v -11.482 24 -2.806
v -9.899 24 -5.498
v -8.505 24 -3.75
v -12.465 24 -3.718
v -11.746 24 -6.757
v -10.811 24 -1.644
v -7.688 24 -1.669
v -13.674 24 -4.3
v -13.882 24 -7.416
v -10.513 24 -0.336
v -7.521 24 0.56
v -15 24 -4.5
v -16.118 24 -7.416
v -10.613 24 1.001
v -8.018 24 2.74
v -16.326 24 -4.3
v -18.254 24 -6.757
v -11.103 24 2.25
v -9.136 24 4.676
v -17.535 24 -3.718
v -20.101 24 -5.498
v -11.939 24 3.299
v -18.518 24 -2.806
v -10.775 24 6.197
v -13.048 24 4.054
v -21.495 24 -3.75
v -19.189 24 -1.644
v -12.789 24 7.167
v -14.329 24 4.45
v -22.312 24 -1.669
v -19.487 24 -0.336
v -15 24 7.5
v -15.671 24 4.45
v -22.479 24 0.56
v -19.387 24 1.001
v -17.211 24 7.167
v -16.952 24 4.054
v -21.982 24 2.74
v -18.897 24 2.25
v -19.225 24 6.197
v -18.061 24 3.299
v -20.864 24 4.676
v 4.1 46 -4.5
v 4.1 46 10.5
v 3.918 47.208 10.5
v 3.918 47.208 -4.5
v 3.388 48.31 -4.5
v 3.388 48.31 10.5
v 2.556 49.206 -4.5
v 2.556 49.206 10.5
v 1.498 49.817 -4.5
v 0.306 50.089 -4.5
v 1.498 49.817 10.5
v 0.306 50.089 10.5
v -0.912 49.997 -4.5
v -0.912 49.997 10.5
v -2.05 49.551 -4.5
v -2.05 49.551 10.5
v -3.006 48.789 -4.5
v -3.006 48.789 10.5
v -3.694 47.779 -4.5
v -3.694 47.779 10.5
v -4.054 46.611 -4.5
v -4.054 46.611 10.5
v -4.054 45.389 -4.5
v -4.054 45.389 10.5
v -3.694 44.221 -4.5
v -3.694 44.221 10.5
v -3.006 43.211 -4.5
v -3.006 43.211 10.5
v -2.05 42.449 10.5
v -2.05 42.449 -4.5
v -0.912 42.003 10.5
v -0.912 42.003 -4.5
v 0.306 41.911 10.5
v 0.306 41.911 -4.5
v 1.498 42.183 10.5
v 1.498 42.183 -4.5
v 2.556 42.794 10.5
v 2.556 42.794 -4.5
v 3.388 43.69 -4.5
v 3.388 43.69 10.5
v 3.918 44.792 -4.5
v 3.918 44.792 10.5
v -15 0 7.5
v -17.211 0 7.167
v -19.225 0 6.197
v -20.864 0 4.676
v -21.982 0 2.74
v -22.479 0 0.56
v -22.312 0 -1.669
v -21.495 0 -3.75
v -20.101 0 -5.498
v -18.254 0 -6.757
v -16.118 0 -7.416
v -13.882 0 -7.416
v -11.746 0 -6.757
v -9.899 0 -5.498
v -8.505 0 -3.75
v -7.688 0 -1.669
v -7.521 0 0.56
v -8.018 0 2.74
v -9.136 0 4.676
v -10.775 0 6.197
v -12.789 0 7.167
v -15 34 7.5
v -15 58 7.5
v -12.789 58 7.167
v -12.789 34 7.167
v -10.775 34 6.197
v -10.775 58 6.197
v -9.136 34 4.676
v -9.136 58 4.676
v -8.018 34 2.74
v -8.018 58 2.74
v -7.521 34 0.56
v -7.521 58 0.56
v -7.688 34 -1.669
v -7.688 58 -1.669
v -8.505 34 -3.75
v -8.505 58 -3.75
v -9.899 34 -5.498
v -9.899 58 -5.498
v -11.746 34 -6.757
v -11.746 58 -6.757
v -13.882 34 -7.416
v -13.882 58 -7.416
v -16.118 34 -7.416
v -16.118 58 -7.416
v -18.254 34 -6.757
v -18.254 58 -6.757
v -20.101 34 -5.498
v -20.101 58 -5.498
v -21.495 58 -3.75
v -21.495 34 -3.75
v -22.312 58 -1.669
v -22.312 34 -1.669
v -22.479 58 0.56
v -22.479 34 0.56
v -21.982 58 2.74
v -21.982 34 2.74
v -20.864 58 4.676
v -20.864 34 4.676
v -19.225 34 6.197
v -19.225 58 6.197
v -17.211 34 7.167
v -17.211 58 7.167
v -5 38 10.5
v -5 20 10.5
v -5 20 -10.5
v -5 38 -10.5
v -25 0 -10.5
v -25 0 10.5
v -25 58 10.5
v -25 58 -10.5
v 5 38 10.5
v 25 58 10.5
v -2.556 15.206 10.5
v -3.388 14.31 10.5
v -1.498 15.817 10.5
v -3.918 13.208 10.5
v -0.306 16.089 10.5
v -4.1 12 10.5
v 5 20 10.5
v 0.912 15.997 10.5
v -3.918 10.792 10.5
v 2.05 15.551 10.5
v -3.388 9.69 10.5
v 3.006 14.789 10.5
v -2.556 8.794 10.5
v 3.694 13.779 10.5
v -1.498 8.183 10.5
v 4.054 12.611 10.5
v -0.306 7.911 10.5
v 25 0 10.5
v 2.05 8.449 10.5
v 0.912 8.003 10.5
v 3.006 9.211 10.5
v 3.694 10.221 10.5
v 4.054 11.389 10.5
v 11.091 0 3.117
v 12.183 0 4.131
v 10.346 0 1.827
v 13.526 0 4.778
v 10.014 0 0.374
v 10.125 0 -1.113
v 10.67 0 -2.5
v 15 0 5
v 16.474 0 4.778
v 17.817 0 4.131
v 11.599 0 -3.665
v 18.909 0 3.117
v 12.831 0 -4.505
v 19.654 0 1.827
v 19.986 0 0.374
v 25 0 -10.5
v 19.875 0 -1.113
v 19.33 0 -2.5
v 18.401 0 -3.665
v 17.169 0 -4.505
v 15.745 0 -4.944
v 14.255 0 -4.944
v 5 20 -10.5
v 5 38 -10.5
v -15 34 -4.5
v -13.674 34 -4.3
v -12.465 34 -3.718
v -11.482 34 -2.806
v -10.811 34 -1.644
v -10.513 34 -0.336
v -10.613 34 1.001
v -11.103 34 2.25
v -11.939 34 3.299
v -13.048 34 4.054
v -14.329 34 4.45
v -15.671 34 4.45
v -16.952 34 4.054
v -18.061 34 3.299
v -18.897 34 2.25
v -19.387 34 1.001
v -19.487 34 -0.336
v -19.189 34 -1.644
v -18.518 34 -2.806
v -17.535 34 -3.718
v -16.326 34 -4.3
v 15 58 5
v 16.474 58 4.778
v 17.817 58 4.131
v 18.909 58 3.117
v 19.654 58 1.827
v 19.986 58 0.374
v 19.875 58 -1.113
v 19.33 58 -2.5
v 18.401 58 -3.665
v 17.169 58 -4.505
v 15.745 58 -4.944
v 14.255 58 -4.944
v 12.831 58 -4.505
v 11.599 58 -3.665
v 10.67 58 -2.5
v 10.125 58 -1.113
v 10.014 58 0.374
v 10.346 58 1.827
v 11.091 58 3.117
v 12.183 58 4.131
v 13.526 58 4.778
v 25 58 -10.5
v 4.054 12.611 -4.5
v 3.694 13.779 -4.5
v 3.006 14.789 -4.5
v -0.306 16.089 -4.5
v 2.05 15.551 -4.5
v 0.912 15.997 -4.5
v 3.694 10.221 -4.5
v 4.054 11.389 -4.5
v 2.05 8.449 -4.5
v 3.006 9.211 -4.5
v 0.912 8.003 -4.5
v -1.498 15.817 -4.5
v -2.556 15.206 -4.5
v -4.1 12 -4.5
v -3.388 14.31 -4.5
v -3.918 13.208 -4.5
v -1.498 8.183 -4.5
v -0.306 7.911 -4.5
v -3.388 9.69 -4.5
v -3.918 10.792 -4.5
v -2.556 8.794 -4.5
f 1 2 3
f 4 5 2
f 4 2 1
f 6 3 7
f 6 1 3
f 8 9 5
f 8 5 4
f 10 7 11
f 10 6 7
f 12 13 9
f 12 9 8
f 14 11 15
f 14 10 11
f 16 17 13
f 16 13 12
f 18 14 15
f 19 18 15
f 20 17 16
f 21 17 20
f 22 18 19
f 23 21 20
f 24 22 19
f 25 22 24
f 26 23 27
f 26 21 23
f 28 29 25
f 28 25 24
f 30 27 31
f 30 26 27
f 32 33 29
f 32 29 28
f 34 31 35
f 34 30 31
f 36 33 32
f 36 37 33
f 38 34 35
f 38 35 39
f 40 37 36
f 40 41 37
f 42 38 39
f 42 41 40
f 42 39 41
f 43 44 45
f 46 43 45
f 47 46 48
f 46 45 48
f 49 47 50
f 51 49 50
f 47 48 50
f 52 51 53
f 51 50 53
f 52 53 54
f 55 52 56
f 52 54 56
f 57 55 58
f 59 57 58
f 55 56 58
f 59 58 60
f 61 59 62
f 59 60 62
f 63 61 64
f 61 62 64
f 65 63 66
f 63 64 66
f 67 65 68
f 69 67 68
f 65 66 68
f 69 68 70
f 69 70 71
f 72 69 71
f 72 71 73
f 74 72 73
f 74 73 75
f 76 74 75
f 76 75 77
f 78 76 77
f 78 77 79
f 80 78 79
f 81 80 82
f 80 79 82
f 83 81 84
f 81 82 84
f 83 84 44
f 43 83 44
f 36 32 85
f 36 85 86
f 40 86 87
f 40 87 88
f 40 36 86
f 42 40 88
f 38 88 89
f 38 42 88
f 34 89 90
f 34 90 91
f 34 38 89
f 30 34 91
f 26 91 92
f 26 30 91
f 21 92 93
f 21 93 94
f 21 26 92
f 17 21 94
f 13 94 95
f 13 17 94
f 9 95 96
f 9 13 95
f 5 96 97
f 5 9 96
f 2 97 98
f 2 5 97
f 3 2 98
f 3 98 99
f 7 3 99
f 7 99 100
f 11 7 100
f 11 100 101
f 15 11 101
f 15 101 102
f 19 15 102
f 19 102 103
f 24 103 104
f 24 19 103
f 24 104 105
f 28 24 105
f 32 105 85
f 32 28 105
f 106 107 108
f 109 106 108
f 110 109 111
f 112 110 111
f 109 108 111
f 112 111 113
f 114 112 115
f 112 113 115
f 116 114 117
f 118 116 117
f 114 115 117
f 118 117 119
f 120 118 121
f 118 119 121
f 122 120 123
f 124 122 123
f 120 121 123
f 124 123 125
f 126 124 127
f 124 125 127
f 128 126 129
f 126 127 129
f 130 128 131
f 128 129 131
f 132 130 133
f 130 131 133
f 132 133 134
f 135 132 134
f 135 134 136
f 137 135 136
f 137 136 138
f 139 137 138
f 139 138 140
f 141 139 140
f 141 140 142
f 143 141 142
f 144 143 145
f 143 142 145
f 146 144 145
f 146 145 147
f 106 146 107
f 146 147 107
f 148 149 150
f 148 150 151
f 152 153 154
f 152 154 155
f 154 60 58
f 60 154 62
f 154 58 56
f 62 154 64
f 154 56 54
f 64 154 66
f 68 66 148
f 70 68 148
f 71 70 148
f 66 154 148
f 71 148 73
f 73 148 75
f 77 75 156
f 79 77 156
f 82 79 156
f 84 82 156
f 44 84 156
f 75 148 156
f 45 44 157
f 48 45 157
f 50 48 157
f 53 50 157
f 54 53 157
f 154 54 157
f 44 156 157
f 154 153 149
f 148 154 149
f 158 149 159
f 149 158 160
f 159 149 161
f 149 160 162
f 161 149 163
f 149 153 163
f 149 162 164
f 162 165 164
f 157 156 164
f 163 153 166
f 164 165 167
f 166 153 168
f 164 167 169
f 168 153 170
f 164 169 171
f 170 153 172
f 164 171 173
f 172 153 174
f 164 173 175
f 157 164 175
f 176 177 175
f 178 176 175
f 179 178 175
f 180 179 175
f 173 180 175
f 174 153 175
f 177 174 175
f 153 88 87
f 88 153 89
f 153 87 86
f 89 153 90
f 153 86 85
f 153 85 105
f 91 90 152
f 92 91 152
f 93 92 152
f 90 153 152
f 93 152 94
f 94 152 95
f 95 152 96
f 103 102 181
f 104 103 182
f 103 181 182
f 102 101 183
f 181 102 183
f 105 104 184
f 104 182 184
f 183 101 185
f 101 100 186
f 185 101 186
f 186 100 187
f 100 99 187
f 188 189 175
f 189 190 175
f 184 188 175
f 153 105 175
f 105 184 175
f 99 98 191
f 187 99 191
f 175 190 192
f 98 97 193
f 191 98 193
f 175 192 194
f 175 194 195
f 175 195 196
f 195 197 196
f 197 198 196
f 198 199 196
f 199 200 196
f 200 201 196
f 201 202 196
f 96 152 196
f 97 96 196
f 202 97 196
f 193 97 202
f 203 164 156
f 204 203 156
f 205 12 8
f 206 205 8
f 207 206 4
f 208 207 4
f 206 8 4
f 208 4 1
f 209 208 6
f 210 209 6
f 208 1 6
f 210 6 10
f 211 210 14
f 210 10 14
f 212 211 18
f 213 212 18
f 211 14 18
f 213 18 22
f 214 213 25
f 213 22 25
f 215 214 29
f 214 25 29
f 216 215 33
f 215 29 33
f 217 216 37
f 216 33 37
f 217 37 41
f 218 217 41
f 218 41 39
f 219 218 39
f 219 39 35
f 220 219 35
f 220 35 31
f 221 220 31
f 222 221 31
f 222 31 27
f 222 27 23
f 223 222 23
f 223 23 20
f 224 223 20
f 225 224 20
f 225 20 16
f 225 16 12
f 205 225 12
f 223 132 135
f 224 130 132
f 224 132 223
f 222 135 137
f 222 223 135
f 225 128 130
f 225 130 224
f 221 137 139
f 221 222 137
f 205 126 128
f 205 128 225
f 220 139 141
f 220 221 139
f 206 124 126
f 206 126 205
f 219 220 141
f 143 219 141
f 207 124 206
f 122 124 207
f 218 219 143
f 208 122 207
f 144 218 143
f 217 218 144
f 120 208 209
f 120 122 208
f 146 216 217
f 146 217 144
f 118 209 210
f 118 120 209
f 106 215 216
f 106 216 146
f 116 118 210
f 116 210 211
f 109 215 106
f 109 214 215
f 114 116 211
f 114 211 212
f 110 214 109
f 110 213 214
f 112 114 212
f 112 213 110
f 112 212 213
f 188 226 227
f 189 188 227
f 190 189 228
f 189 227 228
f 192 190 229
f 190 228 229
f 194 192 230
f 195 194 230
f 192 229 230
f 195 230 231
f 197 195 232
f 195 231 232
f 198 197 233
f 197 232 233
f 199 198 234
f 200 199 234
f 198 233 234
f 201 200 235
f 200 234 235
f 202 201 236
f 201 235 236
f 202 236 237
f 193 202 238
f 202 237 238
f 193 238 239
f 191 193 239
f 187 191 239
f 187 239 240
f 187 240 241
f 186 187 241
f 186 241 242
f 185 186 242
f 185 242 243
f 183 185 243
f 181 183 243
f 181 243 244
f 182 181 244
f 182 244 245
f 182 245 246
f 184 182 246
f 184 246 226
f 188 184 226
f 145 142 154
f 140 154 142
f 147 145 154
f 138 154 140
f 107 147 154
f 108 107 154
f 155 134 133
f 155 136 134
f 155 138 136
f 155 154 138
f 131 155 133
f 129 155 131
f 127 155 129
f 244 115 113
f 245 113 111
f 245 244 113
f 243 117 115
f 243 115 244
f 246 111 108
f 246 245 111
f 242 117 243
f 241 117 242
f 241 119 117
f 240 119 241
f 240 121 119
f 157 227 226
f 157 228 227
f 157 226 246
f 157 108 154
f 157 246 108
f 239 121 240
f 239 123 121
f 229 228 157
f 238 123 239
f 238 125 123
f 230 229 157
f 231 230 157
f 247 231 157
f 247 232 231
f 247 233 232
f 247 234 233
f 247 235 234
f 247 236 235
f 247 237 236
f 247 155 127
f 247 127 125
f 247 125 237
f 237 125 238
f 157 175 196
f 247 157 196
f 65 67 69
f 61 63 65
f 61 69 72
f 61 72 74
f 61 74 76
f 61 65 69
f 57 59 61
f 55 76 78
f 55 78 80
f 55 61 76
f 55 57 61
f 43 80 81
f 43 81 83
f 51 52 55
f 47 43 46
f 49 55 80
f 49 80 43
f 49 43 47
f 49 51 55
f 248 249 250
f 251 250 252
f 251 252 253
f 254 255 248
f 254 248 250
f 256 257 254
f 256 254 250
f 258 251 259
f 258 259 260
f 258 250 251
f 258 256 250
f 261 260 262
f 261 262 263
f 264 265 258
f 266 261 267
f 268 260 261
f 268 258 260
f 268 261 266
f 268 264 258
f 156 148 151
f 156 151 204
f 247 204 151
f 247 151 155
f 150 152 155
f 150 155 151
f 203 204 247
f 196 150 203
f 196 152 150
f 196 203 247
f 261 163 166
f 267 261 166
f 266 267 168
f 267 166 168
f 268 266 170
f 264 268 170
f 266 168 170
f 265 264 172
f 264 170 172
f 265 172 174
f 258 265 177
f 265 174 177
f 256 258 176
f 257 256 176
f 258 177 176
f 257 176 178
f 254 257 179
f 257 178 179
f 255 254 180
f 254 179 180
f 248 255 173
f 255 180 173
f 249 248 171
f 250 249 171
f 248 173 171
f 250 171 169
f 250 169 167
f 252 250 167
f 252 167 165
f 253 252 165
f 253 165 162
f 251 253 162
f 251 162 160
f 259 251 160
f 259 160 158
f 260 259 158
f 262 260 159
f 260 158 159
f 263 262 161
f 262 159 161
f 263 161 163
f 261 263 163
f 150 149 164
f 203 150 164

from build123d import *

# Parameters (mm, degrees)
SKETCH1_W           = 50
SKETCH1_H           = 21
BOSS_EXTRUDE1_DEPTH = 58
SKETCH3_R           = 7.5
CUT_EXTRUDE1_DEPTH  = 24
CUT_EXTRUDE2_REACH  = 66.025
SKETCH4_R           = 5
CUT_EXTRUDE3_START  = -24
SKETCH5_R           = 7.5
CUT_EXTRUDE3_DEPTH  = 24
CUT_EXTRUDE4_REACH  = 66.025
SKETCH6_R           = 4.5
CUT_EXTRUDE5_REACH  = 68.558
SKETCH8_W           = 10
SKETCH8_H           = 18
SKETCH7_R           = 4.1
CUT_EXTRUDE6_DEPTH  = 15


with BuildPart() as part:
    # Sketch1 → Boss-Extrude1 (new body)
    with BuildSketch(Plane(origin=(0, 0, 0), x_dir=(1, 0, 0), z_dir=(0, 1, 0))):
        Rectangle(SKETCH1_W, SKETCH1_H)
    extrude(amount=BOSS_EXTRUDE1_DEPTH)

    # Sketch3 → Cut-Extrude1 (cut)
    with BuildSketch(Plane(origin=(0, 58, 0), x_dir=(1, 0, 0), z_dir=(0, 1, 0))):
        with Locations(Location((-15, 0, 0), (0, 0, 270))):
            Circle(SKETCH3_R)
    extrude(amount=-CUT_EXTRUDE1_DEPTH, mode=Mode.SUBTRACT)

    # Sketch4 → Cut-Extrude2 (cut, up to next)
    with BuildSketch(Plane(origin=(0, 58, 0), x_dir=(1, 0, 0), z_dir=(0, 1, 0)), mode=Mode.PRIVATE) as cut_extrude2_sk1:
        with Locations(Location((15, 0, 0), (0, 0, 270))):
            Circle(SKETCH4_R)
    cut_extrude2_tool1 = extrude(cut_extrude2_sk1.sketch, amount=-CUT_EXTRUDE2_REACH, mode=Mode.PRIVATE) & part.part
    add(cut_extrude2_tool1.solids().sort_by_distance((15, 58, 0))[0], mode=Mode.SUBTRACT)

    # Sketch5 → Cut-Extrude3 (cut)
    with BuildSketch(Plane.XZ.offset(CUT_EXTRUDE3_START)):
        with Locations(Location((-15, 0, 0), (0, 0, 90))):
            Circle(SKETCH5_R)
    extrude(amount=CUT_EXTRUDE3_DEPTH, mode=Mode.SUBTRACT)

    # Sketch6 → Cut-Extrude4 (cut, up to next)
    with BuildSketch(Plane.XZ, mode=Mode.PRIVATE) as cut_extrude4_sk1:
        with Locations(Location((-15, 0, 0), (0, 0, 270))):
            Circle(SKETCH6_R)
    cut_extrude4_tool1 = extrude(cut_extrude4_sk1.sketch, amount=-CUT_EXTRUDE4_REACH, mode=Mode.PRIVATE) & part.part
    add(cut_extrude4_tool1.solids().sort_by_distance((-15, 0, 0))[0], mode=Mode.SUBTRACT)

    # Sketch8 → Cut-Extrude5 (cut, up to next)
    with BuildSketch(Plane.XY.offset(10.5), mode=Mode.PRIVATE) as cut_extrude5_sk1:
        with Locations((0, 29)):
            Rectangle(SKETCH8_W, SKETCH8_H)
    cut_extrude5_tool1 = extrude(cut_extrude5_sk1.sketch, amount=-CUT_EXTRUDE5_REACH, mode=Mode.PRIVATE) & part.part
    add(cut_extrude5_tool1.solids().sort_by_distance((0, 29, 10.5))[0], mode=Mode.SUBTRACT)

    # Sketch7 → Cut-Extrude6 (cut)
    with BuildSketch(Plane.XY.offset(10.5)):
        with Locations((0, 46)):
            Circle(SKETCH7_R)
        with Locations(Location((0, 12, 0), (0, 0, 180))):
            Circle(SKETCH7_R)
    extrude(amount=-CUT_EXTRUDE6_DEPTH, mode=Mode.SUBTRACT)


solid = part.part
